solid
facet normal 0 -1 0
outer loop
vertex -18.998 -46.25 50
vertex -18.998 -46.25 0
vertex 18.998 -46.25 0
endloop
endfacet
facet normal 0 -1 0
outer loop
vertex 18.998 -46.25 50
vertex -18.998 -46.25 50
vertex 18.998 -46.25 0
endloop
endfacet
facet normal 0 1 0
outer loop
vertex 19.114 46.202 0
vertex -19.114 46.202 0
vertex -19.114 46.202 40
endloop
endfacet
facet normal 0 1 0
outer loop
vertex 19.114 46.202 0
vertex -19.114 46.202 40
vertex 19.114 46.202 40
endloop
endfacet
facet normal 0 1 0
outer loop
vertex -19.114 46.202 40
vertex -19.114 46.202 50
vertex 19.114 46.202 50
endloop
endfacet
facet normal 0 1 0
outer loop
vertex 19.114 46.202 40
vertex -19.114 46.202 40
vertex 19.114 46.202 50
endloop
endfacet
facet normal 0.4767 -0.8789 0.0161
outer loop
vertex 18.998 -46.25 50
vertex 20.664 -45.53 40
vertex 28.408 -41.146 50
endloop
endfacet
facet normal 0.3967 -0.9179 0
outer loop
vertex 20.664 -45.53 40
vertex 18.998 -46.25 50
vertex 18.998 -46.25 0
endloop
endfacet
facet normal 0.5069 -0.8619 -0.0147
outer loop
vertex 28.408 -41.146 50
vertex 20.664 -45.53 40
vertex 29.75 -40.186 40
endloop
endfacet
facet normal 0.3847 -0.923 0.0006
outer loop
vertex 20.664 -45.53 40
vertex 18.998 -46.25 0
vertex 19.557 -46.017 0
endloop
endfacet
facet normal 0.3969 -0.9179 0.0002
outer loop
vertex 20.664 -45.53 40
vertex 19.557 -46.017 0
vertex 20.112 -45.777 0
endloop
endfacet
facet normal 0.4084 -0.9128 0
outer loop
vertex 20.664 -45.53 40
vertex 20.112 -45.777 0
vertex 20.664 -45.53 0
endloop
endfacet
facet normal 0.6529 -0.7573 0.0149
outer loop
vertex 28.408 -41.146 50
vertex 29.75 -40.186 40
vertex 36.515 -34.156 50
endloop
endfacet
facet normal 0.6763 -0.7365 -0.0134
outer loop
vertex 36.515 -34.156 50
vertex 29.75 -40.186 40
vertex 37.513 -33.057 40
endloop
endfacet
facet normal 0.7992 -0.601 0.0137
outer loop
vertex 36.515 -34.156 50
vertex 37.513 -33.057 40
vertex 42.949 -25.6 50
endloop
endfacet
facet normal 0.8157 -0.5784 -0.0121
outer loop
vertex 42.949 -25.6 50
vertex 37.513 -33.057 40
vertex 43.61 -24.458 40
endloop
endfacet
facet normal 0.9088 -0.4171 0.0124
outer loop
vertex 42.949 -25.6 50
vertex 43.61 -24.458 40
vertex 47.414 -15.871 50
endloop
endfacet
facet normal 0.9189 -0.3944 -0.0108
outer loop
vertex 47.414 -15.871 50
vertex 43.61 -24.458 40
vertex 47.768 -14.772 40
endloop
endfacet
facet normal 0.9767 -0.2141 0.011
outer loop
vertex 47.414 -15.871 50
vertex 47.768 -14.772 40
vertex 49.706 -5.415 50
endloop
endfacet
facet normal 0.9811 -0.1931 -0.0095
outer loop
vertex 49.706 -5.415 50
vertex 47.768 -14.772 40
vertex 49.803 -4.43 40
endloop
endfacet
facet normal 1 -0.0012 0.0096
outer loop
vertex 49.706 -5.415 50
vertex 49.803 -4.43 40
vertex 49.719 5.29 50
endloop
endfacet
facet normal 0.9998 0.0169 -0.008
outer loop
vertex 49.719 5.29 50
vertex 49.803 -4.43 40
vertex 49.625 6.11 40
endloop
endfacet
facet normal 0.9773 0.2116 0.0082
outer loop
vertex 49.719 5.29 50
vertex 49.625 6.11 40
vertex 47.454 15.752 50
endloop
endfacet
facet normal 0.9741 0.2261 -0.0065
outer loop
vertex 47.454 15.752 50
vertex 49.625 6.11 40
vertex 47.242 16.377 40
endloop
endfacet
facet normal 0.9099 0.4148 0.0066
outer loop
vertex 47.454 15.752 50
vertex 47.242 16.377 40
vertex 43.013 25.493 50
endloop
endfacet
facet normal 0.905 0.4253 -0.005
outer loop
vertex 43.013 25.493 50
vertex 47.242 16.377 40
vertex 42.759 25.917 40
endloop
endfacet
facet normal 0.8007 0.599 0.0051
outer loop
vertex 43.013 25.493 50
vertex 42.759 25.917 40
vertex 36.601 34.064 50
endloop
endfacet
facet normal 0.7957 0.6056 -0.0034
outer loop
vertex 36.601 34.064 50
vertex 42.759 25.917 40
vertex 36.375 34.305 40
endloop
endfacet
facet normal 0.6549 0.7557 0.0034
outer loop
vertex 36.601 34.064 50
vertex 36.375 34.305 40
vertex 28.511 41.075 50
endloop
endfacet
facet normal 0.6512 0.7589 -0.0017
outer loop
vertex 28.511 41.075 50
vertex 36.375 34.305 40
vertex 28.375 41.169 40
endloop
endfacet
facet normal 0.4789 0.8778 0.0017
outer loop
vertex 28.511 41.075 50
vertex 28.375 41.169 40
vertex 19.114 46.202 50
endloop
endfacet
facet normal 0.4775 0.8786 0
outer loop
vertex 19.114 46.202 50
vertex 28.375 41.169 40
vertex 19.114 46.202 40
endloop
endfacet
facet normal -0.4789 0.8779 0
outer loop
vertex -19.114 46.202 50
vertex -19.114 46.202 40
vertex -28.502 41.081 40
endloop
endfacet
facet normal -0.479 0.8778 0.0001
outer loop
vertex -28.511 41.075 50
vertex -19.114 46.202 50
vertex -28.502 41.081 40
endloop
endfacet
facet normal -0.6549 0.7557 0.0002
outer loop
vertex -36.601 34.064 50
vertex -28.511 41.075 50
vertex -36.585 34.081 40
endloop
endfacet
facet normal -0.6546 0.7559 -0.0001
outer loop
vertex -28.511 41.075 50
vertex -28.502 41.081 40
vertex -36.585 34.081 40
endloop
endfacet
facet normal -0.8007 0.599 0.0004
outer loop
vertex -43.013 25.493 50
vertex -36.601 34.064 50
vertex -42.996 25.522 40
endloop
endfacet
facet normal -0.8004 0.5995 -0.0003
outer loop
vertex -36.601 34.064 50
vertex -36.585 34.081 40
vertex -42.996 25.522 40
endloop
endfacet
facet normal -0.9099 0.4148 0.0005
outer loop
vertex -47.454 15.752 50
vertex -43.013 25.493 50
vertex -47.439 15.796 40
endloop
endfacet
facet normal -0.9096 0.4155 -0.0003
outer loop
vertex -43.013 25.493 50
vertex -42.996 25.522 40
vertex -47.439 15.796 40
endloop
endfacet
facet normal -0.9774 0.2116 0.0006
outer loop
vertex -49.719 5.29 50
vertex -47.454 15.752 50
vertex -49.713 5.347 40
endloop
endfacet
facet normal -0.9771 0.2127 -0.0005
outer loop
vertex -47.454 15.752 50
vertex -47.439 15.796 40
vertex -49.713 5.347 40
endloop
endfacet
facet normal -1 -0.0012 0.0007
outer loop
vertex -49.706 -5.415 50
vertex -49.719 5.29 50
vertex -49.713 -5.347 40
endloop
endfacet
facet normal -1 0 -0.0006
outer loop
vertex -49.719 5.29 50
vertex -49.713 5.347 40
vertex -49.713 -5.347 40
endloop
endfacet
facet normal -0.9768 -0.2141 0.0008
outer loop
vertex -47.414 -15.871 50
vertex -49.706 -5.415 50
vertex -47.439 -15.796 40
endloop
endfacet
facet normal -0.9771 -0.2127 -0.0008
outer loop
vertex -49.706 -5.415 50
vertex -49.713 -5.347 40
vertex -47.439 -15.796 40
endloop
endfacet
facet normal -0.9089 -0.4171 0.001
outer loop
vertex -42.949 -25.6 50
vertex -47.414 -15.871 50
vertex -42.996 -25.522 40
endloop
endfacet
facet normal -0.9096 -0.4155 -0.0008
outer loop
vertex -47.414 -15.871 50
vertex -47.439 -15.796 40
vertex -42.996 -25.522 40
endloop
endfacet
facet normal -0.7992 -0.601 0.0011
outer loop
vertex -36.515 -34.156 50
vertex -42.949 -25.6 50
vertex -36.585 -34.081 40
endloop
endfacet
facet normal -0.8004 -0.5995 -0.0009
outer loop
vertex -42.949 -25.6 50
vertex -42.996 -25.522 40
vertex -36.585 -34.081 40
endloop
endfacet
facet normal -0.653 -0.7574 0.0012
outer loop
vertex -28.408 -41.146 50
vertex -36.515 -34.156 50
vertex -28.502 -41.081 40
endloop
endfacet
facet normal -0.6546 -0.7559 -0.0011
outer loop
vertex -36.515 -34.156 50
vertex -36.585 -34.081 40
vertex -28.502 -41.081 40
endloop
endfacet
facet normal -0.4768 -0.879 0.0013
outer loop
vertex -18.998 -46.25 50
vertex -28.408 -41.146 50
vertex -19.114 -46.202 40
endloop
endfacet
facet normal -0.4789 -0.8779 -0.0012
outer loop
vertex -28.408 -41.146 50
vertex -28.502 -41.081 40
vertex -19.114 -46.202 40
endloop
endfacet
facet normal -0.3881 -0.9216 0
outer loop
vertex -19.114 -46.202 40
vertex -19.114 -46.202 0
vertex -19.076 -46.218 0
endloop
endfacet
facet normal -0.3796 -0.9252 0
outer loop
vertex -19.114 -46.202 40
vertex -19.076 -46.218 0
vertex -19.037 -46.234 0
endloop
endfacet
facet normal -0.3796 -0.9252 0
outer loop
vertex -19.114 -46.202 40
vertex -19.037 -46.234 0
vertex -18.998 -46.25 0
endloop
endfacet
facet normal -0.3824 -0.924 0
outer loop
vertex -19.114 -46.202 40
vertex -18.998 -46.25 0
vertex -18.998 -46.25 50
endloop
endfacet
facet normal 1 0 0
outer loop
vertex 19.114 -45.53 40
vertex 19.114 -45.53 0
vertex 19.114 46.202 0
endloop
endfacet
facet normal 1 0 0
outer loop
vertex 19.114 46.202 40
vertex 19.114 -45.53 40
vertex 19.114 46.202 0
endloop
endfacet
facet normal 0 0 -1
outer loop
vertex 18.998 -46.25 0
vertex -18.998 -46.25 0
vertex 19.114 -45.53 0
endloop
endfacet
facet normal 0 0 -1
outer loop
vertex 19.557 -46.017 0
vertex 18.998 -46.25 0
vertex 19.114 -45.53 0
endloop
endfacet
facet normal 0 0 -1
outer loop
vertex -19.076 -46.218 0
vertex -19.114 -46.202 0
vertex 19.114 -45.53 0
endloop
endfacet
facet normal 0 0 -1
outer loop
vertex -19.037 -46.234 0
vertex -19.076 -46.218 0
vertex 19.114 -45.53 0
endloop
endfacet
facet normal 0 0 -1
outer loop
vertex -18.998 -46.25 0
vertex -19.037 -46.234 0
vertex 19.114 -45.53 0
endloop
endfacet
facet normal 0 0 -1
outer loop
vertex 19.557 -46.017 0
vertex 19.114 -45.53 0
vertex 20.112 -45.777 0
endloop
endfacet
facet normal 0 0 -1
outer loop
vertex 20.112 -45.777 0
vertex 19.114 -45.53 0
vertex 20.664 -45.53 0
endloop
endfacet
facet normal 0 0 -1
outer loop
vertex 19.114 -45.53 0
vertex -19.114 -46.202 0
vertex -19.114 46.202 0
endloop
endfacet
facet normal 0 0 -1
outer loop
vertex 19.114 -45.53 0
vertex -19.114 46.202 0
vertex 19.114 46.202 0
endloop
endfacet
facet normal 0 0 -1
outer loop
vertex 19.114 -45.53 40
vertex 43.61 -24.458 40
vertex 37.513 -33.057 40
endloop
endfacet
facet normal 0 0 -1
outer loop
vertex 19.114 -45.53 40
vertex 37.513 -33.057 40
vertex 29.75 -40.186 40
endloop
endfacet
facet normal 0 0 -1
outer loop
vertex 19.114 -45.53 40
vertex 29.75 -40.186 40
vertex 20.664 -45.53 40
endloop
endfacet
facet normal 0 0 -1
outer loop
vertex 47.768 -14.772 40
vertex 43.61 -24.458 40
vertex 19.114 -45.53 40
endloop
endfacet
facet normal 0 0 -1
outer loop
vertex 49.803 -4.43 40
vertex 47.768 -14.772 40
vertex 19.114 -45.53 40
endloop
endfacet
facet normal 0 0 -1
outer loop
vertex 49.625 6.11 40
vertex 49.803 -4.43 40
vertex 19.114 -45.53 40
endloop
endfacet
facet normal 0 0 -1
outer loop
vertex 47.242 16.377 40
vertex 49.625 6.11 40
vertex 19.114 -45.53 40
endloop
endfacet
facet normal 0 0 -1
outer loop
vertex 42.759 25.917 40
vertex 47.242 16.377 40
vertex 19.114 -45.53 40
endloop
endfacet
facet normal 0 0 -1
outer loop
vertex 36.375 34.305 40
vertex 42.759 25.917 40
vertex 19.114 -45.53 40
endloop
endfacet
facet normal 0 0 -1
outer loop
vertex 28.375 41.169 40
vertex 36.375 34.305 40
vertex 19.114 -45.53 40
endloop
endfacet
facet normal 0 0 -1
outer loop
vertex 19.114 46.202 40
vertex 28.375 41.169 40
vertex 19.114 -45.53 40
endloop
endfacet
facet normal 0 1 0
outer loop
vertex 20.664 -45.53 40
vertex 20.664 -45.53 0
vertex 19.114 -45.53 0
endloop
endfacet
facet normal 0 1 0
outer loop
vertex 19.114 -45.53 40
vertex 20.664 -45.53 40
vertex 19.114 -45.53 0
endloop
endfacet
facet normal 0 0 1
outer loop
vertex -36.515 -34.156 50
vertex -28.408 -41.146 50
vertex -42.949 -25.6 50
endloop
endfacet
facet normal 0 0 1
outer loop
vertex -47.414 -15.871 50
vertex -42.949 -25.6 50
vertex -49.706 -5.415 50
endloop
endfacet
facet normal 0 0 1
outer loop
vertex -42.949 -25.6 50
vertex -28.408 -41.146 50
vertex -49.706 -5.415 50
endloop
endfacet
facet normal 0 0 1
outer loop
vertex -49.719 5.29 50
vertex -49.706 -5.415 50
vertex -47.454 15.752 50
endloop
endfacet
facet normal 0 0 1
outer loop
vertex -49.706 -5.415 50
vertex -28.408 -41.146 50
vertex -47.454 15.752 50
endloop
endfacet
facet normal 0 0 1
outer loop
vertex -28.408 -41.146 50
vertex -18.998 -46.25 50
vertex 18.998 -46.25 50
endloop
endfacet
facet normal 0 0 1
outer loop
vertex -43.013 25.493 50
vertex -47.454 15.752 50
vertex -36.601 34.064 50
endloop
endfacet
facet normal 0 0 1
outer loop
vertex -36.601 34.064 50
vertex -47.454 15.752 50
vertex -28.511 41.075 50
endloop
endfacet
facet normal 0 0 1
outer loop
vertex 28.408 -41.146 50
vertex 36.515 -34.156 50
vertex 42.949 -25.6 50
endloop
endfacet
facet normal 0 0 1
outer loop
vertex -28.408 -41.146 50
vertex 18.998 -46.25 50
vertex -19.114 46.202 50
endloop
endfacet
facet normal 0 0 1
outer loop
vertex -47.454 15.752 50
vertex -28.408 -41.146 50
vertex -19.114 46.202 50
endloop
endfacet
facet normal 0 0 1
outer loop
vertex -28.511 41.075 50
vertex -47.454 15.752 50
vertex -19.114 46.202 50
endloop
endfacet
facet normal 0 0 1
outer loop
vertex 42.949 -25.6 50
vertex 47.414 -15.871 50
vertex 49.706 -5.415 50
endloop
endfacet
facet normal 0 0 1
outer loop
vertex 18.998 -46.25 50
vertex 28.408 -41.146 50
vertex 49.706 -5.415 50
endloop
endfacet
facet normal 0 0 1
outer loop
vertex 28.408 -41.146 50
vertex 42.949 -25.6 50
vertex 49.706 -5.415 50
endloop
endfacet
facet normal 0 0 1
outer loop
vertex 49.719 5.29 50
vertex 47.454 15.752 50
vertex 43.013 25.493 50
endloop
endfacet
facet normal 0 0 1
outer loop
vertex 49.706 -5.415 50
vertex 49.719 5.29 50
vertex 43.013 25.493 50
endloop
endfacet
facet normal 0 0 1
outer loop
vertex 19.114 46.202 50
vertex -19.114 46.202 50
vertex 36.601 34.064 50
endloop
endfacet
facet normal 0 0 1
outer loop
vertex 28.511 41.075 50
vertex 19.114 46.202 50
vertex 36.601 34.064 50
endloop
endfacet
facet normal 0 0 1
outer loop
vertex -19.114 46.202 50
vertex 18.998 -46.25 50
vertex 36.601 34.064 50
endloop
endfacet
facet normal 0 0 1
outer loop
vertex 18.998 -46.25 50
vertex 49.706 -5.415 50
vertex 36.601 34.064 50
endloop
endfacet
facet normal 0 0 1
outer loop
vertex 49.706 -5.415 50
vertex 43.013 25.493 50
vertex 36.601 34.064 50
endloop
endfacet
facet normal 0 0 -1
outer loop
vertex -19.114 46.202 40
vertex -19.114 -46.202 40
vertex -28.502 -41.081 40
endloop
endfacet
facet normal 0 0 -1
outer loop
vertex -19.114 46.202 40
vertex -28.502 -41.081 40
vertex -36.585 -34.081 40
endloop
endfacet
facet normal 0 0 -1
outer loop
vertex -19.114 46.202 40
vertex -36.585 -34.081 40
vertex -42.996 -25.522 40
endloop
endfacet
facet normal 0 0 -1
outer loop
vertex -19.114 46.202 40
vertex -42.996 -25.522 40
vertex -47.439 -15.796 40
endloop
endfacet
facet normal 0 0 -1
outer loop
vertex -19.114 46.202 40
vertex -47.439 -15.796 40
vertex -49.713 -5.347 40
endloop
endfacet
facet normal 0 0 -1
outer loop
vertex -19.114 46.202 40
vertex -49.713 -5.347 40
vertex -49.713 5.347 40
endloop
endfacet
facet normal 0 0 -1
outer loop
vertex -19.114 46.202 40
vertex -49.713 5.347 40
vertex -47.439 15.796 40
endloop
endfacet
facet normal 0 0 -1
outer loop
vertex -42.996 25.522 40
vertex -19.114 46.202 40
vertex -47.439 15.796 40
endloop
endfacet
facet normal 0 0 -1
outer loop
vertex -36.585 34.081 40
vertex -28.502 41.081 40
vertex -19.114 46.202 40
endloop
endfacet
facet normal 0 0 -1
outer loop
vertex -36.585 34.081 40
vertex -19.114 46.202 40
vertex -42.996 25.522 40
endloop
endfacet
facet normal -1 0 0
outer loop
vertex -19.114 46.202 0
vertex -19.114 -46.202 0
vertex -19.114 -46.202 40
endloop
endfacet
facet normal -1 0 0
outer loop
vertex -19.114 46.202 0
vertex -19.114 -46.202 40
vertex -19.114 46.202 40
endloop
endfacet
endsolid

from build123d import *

# Parameters (mm, degrees)
SKETCH_1_R               = 50
EXTRUDE_1_DEPTH          = 57.7
SKETCH_2_W               = 88.552643685
SKETCH_2_H               = 15.944116671
SKETCH_2_W_2             = 133.424200465
SKETCH_2_H_2             = 21.693790907
CUT_EXTRUDE_1_DEPTH      = 57.7
SKETCH_3_W               = 51.791054301
SKETCH_3_H               = 91.732420586
SKETCH_3_W_2             = 35.451128289
SKETCH_3_H_2             = 96.304213357
CUT_EXTRUDE_2_DEPTH      = 40
CUT_EXTRUDE_3_DEPTH      = 35
CUT_EXTRUDE_3_DEPTH_BACK = 77
SKETCH_5_W               = 7.7
SKETCH_5_H               = 94.441631117


with BuildPart() as part:
    # 草图1 → 凸台-拉伸1 (new body)
    with BuildSketch(Plane.XY):
        Circle(SKETCH_1_R)
    extrude(amount=EXTRUDE_1_DEPTH)

    # 草图2 → 切除-拉伸1 (cut)
    with BuildSketch(Plane.XY.offset(57.7)):
        with Locations((0.613398072, 54.174358248)):
            Rectangle(SKETCH_2_W, SKETCH_2_H)
        with Locations((13.337614445, -57.096895454)):
            Rectangle(SKETCH_2_W_2, SKETCH_2_H_2)
    extrude(amount=-CUT_EXTRUDE_1_DEPTH, mode=Mode.SUBTRACT)

    # 草图3 → 切除-拉伸2 (cut)
    with BuildSketch(Plane(origin=(0, 0, 0), x_dir=(-1, 0, 0), z_dir=(0, 0, -1))):
        with Locations((-45.009592204, 0.336089619)):
            Rectangle(SKETCH_3_W, SKETCH_3_H)
        with Locations((36.839629198, -1.949806767)):
            Rectangle(SKETCH_3_W_2, SKETCH_3_H_2)
    extrude(amount=-CUT_EXTRUDE_2_DEPTH, mode=Mode.SUBTRACT)

    # 草图5 → 切除-拉伸3 (cut, two sides: drawn at the far end of the back side and taken through both)
    with BuildSketch(Plane.ZY.offset(19.114065053).offset(-CUT_EXTRUDE_3_DEPTH_BACK)):
        with Locations((53.85, -1.018515647)):
            Rectangle(SKETCH_5_W, SKETCH_5_H)
    extrude(amount=CUT_EXTRUDE_3_DEPTH + CUT_EXTRUDE_3_DEPTH_BACK, mode=Mode.SUBTRACT)


solid = part.part
